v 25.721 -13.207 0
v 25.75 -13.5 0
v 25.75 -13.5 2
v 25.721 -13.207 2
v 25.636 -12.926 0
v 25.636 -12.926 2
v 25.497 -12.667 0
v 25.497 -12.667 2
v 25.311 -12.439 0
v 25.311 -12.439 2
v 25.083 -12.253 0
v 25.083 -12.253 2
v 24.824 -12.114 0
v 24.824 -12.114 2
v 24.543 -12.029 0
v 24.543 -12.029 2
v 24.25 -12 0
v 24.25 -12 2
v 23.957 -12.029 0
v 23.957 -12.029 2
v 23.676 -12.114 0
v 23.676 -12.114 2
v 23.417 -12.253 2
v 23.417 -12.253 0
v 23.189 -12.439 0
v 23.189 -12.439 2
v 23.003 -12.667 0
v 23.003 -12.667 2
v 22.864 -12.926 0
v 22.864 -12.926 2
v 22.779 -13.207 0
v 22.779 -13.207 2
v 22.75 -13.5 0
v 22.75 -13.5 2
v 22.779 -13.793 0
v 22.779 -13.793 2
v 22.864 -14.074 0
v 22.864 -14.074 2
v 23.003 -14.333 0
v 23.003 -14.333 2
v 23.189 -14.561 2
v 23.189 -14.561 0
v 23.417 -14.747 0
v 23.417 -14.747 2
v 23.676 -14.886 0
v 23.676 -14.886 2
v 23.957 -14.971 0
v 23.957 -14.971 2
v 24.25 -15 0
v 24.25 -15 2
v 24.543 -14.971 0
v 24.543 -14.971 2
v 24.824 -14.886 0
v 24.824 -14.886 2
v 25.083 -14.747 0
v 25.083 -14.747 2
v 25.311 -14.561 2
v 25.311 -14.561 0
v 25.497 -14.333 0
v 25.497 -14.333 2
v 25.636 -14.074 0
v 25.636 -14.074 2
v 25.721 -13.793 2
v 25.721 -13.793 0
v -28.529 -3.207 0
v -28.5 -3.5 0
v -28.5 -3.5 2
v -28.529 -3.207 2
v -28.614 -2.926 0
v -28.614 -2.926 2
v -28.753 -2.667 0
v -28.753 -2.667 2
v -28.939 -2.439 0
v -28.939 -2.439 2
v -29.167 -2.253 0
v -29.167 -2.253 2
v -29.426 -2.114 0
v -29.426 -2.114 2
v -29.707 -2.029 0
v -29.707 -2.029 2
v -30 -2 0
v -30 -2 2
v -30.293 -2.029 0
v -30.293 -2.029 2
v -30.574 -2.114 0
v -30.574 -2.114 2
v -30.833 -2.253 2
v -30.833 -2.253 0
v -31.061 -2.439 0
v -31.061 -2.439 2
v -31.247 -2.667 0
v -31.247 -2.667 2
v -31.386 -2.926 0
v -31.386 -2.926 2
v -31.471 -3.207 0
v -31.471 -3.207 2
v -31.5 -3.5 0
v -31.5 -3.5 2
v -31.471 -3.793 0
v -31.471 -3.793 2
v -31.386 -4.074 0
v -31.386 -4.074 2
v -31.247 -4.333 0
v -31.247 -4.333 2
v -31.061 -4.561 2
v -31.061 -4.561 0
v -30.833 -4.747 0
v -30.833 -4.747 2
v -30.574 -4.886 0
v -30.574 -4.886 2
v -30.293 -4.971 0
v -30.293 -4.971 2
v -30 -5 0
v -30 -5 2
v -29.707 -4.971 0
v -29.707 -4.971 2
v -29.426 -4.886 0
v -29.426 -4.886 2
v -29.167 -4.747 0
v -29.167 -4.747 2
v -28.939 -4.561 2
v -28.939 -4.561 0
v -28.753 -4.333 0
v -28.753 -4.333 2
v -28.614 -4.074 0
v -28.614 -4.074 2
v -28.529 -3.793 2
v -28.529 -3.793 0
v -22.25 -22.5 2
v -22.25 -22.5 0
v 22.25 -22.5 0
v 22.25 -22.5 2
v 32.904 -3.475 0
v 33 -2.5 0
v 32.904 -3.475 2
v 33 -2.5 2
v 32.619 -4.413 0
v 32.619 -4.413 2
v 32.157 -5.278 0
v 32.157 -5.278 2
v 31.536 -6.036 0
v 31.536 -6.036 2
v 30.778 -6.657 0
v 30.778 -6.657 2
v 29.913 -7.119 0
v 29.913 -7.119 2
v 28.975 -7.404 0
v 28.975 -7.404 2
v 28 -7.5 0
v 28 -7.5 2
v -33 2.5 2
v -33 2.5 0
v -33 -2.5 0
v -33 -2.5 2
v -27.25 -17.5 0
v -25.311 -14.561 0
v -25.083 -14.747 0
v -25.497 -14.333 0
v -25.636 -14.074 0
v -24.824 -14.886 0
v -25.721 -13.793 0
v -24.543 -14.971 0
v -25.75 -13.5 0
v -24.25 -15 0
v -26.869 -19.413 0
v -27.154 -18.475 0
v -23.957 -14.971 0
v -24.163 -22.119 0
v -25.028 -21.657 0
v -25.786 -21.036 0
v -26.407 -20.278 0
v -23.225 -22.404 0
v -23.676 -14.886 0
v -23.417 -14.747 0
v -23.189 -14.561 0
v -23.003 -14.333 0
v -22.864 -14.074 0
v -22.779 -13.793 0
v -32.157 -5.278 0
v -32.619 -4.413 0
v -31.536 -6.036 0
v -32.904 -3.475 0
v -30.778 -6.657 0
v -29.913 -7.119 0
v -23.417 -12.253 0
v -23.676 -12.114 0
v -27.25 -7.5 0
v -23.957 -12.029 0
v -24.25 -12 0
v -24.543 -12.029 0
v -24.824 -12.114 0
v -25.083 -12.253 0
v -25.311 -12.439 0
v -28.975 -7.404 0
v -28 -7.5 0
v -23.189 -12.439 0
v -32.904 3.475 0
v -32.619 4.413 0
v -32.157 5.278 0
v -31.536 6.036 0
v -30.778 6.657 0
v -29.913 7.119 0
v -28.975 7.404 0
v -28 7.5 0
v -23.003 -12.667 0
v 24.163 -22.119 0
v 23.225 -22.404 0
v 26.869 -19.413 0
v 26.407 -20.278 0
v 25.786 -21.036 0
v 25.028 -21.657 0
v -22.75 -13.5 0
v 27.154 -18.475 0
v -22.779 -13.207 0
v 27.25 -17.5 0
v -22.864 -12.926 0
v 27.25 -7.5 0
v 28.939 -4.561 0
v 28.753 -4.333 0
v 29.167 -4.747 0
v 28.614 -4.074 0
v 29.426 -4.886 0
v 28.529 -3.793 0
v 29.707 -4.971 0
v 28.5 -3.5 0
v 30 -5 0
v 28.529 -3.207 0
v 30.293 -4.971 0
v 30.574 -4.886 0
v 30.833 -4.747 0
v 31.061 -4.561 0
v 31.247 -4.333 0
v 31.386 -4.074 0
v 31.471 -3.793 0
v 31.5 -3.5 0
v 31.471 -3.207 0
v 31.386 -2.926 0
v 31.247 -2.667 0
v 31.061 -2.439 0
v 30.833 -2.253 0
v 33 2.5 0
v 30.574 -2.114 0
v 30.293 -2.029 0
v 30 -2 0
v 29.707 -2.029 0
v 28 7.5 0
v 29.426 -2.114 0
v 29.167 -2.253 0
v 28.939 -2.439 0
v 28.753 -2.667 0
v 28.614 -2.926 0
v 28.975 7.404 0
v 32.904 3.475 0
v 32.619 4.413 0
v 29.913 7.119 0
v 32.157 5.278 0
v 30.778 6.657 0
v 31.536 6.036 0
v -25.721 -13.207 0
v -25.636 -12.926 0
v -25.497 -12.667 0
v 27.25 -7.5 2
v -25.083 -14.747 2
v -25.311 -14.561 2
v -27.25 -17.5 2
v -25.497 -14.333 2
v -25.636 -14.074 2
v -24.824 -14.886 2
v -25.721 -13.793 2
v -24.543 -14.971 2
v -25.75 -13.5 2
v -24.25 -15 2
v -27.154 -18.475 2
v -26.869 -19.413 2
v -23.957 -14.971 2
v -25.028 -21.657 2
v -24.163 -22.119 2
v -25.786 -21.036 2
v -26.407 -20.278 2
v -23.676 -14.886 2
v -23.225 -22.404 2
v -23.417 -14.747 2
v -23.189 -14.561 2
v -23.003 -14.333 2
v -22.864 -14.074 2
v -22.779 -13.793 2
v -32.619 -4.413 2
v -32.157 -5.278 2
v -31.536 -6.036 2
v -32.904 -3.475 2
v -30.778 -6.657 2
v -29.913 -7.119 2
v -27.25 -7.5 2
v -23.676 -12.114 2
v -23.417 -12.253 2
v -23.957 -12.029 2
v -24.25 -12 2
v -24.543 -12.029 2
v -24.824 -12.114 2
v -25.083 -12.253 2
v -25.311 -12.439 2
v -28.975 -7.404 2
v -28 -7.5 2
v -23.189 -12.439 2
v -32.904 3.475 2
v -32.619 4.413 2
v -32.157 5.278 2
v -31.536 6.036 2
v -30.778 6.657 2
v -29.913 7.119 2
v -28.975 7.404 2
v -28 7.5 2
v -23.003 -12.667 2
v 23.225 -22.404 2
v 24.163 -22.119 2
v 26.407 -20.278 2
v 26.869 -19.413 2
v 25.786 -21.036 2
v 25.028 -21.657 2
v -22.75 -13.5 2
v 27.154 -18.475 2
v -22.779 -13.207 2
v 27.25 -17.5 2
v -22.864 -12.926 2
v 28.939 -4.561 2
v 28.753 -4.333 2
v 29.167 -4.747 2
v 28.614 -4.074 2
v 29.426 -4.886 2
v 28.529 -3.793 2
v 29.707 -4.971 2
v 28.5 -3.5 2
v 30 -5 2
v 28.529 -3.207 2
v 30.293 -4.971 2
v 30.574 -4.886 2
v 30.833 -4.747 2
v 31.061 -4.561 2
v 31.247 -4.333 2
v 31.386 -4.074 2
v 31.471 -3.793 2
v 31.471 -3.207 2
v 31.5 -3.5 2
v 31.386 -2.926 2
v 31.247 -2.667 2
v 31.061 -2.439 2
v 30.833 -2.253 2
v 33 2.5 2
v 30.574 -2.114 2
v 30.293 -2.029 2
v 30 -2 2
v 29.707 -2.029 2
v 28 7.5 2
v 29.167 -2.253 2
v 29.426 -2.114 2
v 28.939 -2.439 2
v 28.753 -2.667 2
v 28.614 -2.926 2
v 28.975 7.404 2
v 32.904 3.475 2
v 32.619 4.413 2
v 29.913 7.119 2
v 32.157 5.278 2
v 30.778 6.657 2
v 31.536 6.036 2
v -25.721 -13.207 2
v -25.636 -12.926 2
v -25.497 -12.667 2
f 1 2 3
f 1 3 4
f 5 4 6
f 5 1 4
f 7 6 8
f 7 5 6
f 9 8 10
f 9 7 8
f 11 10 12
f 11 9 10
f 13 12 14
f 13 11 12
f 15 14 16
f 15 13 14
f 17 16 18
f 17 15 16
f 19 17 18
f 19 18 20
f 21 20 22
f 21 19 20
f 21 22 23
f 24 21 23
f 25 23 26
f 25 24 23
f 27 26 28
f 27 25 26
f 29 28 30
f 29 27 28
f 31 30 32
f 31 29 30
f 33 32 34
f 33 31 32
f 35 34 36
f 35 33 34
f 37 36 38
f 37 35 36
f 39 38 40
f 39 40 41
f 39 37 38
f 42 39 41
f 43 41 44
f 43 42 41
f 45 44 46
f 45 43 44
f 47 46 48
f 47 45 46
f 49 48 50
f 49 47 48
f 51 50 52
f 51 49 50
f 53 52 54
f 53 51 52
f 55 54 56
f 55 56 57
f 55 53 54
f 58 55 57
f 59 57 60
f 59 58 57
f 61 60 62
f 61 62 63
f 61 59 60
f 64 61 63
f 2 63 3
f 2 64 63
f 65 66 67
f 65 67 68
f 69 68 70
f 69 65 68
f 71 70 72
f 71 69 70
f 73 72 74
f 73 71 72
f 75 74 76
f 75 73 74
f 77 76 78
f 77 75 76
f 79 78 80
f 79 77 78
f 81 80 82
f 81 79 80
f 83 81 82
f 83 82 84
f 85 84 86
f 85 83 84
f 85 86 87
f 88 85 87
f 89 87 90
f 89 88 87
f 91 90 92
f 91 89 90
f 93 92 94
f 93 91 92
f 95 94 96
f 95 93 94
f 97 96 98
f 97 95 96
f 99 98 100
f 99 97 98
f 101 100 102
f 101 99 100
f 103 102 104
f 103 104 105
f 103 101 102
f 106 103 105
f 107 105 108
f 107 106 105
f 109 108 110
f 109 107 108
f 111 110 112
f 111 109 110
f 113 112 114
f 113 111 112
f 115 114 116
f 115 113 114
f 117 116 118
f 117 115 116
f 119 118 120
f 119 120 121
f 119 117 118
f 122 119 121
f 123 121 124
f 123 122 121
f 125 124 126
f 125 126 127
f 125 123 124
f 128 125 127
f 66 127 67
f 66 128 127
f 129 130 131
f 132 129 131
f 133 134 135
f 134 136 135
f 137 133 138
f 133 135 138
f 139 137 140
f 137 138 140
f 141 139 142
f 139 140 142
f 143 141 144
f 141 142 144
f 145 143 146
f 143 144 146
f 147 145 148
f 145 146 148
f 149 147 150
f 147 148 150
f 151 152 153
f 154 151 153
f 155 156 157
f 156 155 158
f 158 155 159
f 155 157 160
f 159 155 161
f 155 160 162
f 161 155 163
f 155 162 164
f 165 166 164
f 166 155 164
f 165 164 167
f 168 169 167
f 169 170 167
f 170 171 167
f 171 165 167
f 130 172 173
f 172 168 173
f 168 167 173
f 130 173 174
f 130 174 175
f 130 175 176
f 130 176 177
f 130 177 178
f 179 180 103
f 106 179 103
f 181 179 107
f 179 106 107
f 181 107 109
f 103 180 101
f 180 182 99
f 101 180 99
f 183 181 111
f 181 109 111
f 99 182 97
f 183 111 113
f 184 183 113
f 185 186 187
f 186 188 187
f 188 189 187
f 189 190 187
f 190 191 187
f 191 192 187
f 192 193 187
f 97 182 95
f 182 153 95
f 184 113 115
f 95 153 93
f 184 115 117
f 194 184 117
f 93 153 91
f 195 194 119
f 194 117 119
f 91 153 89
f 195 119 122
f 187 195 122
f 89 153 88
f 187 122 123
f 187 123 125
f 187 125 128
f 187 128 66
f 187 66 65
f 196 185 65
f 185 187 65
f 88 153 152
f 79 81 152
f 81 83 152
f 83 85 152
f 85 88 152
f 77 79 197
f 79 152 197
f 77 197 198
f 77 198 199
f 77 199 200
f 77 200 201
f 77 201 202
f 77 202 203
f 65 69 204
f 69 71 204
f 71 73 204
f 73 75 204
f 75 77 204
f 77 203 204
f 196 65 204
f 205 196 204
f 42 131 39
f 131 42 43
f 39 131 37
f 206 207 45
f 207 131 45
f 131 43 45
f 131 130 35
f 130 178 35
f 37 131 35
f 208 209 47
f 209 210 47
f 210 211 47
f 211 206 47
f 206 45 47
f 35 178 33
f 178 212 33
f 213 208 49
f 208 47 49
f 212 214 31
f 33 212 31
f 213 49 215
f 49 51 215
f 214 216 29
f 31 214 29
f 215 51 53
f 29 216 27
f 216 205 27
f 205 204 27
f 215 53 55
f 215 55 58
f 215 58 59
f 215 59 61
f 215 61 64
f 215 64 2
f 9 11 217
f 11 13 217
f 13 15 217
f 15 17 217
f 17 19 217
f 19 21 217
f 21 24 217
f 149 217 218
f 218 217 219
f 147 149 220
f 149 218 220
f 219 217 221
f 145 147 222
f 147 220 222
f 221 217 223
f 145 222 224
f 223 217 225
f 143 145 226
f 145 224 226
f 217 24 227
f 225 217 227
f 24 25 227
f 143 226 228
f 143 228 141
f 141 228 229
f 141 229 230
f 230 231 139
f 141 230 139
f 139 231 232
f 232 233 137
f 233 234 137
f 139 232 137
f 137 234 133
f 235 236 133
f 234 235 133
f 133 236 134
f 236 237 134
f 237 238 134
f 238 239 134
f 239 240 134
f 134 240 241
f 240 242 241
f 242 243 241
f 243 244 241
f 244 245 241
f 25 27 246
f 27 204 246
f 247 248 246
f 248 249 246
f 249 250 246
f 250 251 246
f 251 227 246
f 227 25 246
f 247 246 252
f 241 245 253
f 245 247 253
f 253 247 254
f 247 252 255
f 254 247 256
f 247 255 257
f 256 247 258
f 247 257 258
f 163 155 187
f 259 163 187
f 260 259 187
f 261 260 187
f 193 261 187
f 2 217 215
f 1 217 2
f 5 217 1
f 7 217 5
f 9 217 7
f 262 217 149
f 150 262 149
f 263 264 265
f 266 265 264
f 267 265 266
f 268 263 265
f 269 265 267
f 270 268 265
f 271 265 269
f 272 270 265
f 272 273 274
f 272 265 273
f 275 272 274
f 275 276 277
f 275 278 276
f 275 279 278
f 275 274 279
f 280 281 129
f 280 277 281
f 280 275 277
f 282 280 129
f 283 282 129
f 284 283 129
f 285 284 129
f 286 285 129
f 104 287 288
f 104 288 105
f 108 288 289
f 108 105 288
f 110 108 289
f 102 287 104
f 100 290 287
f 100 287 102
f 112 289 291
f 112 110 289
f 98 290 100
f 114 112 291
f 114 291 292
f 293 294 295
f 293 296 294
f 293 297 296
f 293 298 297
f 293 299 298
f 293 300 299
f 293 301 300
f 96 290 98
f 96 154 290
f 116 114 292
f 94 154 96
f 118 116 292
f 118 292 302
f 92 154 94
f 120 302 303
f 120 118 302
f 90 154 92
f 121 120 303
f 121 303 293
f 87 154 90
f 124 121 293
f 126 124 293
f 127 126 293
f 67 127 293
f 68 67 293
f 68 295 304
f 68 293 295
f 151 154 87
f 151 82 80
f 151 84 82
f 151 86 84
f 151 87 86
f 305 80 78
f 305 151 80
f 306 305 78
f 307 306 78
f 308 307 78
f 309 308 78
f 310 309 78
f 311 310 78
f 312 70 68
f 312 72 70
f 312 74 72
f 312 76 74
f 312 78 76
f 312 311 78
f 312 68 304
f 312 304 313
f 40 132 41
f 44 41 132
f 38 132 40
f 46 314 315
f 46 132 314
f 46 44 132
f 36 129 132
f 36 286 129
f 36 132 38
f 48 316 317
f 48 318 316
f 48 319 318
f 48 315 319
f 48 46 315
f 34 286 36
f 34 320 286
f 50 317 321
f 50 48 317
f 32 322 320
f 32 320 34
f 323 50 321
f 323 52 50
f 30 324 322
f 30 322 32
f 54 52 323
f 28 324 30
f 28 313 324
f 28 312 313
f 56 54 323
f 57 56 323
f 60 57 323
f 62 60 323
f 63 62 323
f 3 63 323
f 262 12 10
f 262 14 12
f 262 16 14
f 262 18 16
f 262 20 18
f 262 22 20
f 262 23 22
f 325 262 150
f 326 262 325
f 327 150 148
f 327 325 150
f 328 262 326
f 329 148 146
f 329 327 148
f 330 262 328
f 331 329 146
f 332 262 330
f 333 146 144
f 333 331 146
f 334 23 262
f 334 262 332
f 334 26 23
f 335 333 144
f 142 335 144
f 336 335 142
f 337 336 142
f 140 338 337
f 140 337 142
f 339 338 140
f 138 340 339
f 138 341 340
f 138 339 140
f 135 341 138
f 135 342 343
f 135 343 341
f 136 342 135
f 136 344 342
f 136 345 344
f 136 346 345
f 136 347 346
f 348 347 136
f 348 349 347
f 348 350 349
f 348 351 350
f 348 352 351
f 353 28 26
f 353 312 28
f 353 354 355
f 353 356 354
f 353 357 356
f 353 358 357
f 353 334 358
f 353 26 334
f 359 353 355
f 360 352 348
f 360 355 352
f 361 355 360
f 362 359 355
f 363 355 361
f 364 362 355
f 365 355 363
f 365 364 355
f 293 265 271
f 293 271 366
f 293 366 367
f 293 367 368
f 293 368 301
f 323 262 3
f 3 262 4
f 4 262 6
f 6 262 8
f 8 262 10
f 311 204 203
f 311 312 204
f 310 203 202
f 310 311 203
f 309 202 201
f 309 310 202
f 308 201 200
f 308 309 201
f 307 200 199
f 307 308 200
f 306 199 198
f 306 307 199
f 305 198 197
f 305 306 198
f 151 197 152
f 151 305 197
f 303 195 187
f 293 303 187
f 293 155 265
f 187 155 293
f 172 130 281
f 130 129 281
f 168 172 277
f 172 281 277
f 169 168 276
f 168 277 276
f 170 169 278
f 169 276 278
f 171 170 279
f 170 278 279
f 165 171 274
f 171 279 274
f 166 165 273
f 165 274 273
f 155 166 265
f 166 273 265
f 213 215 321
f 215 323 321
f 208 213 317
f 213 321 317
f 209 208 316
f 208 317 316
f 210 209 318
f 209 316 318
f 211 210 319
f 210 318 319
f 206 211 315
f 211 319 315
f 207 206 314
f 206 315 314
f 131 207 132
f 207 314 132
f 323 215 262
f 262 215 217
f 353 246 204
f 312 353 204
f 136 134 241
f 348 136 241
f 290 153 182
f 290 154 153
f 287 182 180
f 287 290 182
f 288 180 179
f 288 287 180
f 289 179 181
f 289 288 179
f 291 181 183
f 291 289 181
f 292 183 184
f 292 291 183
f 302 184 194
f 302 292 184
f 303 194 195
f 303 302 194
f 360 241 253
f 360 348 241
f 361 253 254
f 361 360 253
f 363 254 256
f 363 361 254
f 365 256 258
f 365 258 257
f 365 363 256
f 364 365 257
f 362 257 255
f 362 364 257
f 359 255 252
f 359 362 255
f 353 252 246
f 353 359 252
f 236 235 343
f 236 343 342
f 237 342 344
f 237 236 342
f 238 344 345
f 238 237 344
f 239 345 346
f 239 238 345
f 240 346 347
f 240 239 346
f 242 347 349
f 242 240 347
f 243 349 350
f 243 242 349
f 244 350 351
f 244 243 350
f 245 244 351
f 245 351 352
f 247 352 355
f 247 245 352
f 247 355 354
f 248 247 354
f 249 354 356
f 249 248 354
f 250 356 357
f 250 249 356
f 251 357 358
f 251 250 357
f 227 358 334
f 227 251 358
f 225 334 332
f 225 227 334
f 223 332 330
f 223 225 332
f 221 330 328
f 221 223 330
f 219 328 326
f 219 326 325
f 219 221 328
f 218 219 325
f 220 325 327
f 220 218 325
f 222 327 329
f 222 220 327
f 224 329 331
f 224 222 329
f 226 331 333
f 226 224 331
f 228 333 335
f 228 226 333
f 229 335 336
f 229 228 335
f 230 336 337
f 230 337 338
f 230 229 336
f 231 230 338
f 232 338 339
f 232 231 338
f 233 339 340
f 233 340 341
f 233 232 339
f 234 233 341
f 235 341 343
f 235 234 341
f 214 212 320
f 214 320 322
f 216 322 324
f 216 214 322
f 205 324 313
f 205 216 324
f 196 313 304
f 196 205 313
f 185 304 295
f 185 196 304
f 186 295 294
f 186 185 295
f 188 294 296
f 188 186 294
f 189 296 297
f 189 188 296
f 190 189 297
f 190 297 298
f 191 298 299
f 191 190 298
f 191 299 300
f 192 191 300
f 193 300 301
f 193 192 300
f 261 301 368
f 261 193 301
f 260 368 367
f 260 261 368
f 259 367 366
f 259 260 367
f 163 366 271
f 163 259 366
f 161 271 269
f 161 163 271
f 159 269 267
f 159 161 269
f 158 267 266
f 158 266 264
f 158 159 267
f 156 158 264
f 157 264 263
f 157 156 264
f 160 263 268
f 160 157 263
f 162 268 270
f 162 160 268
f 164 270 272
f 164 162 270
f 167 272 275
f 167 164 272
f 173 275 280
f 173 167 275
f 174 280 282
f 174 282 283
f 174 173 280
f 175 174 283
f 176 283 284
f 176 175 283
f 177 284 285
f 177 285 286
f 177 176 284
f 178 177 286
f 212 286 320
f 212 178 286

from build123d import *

# Parameters (mm, degrees)
F0_R     = 1.5
F0_W     = 54.5
F0_H     = 15
F1_DEPTH = 2
F2_R     = 5


with BuildPart() as f1:
    # F0 (on Top) → F1 (new body)
    with BuildSketch(Plane.XY):
        Polygon((27.25, -7.5), (33, -7.5), (33, 7.5), (-33, 7.5), (-33, -7.5), (-27.25, -7.5), align=None)
        with Locations((-30, -3.5)):
            Circle(F0_R, mode=Mode.SUBTRACT)
        with Locations((30, -3.5)):
            Circle(F0_R, mode=Mode.SUBTRACT)
        with Locations((0, -15)):
            Rectangle(F0_W, F0_H)
        with Locations((-24.25, -13.5)):
            Circle(F0_R, mode=Mode.SUBTRACT)
        with Locations((24.25, -13.5)):
            Circle(F0_R, mode=Mode.SUBTRACT)
    extrude(amount=F1_DEPTH)

    # F2
    f2_edges = [f1.edges().sort_by_distance(p)[0] for p in [
        (-33, 7.5, 1),
        (33, 7.5, 1),
        (27.25, -22.5, 1),
        (-27.25, -22.5, 1),
        (33, -7.5, 1),
        (-33, -7.5, 1),
    ]]
    fillet(f2_edges, radius=F2_R)


solid = f1.part
